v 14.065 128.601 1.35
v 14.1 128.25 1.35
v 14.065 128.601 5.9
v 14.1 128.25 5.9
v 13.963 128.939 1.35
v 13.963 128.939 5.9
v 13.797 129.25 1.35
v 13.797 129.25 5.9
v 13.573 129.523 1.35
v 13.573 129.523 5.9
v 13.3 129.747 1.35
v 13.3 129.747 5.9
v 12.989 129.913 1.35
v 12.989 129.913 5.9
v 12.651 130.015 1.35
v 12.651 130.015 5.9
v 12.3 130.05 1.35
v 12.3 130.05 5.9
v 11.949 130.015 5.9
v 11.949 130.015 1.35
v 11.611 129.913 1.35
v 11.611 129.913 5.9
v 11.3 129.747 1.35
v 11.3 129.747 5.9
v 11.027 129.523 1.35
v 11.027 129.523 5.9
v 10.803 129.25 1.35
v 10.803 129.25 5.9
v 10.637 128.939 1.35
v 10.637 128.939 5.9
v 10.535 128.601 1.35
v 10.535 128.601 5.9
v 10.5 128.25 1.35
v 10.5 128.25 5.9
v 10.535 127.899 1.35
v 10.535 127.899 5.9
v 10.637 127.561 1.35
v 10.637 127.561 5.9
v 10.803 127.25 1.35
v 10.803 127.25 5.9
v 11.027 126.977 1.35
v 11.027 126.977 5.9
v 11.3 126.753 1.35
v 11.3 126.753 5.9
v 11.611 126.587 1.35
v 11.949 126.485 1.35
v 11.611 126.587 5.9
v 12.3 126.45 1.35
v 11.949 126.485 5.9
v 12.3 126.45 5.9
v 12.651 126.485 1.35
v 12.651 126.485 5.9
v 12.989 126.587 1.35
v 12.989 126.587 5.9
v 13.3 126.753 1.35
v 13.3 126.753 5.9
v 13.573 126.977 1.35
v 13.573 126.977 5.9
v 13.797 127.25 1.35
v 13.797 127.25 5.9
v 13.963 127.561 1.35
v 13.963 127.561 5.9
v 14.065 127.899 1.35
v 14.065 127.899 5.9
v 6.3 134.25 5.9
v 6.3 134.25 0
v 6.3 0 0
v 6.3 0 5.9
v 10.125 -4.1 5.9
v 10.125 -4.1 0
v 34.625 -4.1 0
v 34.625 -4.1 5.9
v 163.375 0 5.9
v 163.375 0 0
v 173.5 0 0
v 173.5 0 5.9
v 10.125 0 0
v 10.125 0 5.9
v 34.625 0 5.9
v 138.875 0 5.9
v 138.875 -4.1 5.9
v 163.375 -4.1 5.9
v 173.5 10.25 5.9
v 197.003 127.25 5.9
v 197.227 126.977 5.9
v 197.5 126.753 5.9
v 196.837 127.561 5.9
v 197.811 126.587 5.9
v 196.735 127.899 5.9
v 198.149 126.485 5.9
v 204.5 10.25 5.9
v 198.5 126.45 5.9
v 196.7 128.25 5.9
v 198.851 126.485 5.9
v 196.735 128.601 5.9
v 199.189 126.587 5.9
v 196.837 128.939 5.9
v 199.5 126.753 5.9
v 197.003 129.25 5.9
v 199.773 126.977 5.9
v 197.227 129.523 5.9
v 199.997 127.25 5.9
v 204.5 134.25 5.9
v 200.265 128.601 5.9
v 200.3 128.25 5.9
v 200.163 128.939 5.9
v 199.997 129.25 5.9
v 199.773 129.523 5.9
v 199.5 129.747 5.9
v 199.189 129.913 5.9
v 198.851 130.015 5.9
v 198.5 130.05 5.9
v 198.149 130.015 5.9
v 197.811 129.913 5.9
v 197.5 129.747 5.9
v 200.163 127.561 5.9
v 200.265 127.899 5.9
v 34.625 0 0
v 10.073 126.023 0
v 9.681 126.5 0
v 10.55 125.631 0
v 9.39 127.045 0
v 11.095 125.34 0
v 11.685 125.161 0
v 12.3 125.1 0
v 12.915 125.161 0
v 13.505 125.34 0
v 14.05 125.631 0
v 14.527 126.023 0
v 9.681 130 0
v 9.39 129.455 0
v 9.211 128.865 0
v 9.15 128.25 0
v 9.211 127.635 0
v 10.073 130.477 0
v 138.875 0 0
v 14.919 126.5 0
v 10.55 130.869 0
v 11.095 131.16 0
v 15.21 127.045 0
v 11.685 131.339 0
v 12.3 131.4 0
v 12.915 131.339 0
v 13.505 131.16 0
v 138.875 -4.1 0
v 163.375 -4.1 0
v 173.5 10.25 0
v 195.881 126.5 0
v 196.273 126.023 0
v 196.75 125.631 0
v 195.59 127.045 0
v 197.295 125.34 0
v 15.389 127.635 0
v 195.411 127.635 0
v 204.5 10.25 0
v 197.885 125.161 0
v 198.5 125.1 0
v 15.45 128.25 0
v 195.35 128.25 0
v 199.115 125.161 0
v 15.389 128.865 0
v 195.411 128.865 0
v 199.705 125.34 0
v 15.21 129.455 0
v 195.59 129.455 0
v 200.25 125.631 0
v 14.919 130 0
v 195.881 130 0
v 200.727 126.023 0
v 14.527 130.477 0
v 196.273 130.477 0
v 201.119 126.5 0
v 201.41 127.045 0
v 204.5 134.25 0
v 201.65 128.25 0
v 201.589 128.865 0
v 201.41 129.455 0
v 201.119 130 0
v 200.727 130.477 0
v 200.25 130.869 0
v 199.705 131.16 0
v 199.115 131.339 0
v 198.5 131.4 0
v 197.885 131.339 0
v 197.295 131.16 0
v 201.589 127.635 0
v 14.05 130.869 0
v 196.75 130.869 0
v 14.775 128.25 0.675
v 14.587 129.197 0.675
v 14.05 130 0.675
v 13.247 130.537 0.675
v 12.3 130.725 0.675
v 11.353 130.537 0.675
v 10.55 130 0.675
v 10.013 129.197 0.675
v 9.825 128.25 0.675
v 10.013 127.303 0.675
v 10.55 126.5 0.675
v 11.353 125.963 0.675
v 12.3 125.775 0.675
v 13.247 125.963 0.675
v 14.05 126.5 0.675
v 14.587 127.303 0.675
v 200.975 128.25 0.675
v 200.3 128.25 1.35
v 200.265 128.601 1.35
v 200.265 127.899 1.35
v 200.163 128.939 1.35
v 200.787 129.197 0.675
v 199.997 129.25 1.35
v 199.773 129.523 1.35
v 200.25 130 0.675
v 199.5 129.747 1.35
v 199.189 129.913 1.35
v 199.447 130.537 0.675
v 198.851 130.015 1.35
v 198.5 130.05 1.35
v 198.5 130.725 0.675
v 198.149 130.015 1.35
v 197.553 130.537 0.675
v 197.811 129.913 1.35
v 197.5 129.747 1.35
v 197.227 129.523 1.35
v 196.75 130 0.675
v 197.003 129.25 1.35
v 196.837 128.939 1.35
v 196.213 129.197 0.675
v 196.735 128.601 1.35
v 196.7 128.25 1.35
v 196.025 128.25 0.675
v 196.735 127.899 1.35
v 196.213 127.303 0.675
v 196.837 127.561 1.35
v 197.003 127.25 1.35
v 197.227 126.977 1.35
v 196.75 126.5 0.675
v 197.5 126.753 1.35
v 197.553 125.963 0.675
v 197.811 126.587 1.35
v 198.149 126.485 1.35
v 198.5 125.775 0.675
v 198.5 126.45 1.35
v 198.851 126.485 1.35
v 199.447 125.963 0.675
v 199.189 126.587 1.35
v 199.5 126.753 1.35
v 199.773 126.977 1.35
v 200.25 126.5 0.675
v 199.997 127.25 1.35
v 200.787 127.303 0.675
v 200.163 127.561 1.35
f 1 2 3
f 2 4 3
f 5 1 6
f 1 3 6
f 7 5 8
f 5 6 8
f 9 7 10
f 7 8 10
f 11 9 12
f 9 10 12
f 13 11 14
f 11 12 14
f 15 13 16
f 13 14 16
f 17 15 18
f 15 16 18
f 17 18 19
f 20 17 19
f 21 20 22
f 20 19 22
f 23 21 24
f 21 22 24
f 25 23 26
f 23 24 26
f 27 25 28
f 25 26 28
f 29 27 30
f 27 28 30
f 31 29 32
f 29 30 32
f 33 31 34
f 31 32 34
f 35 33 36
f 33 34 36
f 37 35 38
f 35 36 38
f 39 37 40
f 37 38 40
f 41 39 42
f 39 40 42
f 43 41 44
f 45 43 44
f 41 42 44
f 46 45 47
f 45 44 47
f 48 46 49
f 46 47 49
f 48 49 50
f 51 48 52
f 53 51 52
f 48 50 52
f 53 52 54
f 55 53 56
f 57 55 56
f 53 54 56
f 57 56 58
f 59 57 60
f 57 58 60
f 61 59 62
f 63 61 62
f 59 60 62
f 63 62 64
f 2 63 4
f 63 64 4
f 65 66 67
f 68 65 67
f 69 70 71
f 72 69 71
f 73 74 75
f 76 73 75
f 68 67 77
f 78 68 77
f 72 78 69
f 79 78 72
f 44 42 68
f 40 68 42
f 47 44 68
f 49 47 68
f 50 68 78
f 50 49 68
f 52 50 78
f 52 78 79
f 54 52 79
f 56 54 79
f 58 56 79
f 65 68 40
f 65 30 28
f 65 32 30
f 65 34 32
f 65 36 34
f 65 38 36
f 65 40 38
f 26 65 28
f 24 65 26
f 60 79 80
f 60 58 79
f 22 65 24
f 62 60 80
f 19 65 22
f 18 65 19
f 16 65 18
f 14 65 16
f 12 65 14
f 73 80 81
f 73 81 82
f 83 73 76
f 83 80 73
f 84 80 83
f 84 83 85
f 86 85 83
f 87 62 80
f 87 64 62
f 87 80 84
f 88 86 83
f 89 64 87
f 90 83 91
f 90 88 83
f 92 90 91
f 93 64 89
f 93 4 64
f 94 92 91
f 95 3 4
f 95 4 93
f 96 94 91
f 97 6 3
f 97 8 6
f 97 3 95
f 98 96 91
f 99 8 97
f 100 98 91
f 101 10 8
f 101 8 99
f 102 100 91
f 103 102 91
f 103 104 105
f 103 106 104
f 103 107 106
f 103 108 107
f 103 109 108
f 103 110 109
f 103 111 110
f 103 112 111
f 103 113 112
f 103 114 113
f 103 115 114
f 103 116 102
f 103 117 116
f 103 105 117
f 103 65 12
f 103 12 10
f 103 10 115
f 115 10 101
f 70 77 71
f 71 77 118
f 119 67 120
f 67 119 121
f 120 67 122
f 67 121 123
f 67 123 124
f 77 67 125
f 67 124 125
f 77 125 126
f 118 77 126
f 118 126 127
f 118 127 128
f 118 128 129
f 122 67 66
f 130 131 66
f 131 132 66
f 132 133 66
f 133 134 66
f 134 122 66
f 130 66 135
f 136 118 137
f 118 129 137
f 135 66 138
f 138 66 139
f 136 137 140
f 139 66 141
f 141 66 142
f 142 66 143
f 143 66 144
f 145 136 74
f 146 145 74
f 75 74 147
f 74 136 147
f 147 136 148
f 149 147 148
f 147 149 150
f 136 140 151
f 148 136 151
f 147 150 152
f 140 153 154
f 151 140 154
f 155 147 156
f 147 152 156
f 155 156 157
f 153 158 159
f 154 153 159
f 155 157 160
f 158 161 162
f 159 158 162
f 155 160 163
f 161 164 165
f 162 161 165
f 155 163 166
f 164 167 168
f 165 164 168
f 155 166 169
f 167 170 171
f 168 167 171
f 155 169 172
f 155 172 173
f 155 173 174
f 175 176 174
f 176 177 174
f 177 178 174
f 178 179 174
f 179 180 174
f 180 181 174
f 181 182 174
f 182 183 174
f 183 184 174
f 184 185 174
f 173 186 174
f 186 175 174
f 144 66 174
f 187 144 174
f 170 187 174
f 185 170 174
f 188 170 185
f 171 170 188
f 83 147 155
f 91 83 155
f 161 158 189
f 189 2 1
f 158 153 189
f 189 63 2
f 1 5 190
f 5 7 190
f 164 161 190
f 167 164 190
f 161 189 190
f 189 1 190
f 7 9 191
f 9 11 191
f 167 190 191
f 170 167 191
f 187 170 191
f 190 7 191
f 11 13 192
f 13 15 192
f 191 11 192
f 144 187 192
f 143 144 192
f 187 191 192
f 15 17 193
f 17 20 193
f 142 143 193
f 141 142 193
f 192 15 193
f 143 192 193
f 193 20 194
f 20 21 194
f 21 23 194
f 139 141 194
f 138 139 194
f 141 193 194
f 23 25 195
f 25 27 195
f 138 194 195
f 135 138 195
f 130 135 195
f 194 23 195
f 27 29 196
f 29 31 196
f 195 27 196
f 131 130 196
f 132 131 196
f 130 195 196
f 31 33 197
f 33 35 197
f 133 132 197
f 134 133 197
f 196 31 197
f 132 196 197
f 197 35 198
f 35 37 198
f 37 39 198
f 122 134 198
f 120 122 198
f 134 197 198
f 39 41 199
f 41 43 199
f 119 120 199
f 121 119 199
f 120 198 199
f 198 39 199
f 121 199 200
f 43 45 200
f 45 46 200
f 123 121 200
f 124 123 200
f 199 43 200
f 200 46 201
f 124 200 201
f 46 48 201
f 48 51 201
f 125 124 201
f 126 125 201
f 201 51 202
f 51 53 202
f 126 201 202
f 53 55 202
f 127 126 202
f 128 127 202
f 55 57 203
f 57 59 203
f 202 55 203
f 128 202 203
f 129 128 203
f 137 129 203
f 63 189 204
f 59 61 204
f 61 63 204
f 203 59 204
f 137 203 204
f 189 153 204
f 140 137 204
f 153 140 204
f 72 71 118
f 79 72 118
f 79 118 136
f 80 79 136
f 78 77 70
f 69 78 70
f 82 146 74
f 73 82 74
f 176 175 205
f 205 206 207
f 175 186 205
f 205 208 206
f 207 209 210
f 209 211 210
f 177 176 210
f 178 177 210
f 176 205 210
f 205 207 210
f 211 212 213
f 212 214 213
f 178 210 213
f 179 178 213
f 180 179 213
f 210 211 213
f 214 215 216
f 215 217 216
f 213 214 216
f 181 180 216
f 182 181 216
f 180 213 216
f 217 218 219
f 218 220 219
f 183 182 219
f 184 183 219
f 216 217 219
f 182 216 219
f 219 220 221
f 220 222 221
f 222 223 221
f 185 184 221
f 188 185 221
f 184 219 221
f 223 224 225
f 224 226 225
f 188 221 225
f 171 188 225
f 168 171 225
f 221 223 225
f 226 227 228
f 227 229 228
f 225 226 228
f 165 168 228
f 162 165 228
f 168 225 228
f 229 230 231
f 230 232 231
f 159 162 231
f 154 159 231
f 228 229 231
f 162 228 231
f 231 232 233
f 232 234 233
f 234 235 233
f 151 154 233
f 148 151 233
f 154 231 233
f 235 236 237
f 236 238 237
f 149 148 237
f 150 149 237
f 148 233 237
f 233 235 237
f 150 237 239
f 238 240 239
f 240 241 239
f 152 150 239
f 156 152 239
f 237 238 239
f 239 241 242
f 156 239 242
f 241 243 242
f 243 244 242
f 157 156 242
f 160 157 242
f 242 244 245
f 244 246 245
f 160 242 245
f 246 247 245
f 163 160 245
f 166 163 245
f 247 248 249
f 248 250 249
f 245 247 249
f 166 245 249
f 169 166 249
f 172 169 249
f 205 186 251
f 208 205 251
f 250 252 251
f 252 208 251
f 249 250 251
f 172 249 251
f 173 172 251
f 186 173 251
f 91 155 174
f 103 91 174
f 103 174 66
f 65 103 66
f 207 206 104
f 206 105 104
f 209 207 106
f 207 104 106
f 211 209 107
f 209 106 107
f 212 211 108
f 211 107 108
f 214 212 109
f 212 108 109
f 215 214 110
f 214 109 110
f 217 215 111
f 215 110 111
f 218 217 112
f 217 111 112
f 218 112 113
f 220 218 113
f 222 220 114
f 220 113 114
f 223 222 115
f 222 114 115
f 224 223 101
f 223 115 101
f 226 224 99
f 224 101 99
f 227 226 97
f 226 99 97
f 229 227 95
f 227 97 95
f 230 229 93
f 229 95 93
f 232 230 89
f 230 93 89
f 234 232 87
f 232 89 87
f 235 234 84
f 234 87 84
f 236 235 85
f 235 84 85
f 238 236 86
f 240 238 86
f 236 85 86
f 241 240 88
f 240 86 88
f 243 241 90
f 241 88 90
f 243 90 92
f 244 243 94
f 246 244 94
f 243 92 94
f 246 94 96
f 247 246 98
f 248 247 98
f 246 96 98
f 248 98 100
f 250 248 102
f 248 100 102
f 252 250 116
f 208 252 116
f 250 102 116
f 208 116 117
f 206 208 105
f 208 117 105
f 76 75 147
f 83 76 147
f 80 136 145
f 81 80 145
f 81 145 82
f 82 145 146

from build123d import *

# Parameters (mm, degrees)
BOSS_EXTRUDE1_DEPTH                             = 5.9
MOVE_FACE1_BY                                   = 6.3
CSK_FOR_M3_FLAT_HEAD_MACHINE_SCREW2_D           = 3.6
CSK_FOR_M3_FLAT_HEAD_MACHINE_SCREW2_CSINK_D     = 6.3
CSK_FOR_M3_FLAT_HEAD_MACHINE_SCREW2_CSINK_ANGLE = 90


with BuildPart() as part:
    # Sketch1 → Boss-Extrude1 (new body)
    with BuildSketch(Plane.XY):
        Polygon((0, 0), (10.125, 0), (10.125, -4.1), (34.625, -4.1), (34.625, 0), (138.875, 0), (138.875, -4.1), (163.375, -4.1), (163.375, 0), (173.5, 0), (173.5, 10.25), (204.5, 10.25), (204.5, 134.25), (0, 134.25), align=None)
    extrude(amount=BOSS_EXTRUDE1_DEPTH)

    # Move Face1: a face moved inward by 6.3
    extrude(part.faces().sort_by_distance((0, 67.125, 2.95))[0], amount=MOVE_FACE1_BY, dir=(1, 0, 0), mode=Mode.SUBTRACT)

    # CSK for M3 Flat Head Machine Screw2 (through all)
    with Locations(Plane(origin=(0, 0, 0), x_dir=(-1, 0, 0), z_dir=(0, 0, -1))):
        with Locations((-198.5, 128.25), (-12.3, 128.25)):
            CounterSinkHole(CSK_FOR_M3_FLAT_HEAD_MACHINE_SCREW2_D / 2, CSK_FOR_M3_FLAT_HEAD_MACHINE_SCREW2_CSINK_D / 2, counter_sink_angle=CSK_FOR_M3_FLAT_HEAD_MACHINE_SCREW2_CSINK_ANGLE)


solid = part.part
